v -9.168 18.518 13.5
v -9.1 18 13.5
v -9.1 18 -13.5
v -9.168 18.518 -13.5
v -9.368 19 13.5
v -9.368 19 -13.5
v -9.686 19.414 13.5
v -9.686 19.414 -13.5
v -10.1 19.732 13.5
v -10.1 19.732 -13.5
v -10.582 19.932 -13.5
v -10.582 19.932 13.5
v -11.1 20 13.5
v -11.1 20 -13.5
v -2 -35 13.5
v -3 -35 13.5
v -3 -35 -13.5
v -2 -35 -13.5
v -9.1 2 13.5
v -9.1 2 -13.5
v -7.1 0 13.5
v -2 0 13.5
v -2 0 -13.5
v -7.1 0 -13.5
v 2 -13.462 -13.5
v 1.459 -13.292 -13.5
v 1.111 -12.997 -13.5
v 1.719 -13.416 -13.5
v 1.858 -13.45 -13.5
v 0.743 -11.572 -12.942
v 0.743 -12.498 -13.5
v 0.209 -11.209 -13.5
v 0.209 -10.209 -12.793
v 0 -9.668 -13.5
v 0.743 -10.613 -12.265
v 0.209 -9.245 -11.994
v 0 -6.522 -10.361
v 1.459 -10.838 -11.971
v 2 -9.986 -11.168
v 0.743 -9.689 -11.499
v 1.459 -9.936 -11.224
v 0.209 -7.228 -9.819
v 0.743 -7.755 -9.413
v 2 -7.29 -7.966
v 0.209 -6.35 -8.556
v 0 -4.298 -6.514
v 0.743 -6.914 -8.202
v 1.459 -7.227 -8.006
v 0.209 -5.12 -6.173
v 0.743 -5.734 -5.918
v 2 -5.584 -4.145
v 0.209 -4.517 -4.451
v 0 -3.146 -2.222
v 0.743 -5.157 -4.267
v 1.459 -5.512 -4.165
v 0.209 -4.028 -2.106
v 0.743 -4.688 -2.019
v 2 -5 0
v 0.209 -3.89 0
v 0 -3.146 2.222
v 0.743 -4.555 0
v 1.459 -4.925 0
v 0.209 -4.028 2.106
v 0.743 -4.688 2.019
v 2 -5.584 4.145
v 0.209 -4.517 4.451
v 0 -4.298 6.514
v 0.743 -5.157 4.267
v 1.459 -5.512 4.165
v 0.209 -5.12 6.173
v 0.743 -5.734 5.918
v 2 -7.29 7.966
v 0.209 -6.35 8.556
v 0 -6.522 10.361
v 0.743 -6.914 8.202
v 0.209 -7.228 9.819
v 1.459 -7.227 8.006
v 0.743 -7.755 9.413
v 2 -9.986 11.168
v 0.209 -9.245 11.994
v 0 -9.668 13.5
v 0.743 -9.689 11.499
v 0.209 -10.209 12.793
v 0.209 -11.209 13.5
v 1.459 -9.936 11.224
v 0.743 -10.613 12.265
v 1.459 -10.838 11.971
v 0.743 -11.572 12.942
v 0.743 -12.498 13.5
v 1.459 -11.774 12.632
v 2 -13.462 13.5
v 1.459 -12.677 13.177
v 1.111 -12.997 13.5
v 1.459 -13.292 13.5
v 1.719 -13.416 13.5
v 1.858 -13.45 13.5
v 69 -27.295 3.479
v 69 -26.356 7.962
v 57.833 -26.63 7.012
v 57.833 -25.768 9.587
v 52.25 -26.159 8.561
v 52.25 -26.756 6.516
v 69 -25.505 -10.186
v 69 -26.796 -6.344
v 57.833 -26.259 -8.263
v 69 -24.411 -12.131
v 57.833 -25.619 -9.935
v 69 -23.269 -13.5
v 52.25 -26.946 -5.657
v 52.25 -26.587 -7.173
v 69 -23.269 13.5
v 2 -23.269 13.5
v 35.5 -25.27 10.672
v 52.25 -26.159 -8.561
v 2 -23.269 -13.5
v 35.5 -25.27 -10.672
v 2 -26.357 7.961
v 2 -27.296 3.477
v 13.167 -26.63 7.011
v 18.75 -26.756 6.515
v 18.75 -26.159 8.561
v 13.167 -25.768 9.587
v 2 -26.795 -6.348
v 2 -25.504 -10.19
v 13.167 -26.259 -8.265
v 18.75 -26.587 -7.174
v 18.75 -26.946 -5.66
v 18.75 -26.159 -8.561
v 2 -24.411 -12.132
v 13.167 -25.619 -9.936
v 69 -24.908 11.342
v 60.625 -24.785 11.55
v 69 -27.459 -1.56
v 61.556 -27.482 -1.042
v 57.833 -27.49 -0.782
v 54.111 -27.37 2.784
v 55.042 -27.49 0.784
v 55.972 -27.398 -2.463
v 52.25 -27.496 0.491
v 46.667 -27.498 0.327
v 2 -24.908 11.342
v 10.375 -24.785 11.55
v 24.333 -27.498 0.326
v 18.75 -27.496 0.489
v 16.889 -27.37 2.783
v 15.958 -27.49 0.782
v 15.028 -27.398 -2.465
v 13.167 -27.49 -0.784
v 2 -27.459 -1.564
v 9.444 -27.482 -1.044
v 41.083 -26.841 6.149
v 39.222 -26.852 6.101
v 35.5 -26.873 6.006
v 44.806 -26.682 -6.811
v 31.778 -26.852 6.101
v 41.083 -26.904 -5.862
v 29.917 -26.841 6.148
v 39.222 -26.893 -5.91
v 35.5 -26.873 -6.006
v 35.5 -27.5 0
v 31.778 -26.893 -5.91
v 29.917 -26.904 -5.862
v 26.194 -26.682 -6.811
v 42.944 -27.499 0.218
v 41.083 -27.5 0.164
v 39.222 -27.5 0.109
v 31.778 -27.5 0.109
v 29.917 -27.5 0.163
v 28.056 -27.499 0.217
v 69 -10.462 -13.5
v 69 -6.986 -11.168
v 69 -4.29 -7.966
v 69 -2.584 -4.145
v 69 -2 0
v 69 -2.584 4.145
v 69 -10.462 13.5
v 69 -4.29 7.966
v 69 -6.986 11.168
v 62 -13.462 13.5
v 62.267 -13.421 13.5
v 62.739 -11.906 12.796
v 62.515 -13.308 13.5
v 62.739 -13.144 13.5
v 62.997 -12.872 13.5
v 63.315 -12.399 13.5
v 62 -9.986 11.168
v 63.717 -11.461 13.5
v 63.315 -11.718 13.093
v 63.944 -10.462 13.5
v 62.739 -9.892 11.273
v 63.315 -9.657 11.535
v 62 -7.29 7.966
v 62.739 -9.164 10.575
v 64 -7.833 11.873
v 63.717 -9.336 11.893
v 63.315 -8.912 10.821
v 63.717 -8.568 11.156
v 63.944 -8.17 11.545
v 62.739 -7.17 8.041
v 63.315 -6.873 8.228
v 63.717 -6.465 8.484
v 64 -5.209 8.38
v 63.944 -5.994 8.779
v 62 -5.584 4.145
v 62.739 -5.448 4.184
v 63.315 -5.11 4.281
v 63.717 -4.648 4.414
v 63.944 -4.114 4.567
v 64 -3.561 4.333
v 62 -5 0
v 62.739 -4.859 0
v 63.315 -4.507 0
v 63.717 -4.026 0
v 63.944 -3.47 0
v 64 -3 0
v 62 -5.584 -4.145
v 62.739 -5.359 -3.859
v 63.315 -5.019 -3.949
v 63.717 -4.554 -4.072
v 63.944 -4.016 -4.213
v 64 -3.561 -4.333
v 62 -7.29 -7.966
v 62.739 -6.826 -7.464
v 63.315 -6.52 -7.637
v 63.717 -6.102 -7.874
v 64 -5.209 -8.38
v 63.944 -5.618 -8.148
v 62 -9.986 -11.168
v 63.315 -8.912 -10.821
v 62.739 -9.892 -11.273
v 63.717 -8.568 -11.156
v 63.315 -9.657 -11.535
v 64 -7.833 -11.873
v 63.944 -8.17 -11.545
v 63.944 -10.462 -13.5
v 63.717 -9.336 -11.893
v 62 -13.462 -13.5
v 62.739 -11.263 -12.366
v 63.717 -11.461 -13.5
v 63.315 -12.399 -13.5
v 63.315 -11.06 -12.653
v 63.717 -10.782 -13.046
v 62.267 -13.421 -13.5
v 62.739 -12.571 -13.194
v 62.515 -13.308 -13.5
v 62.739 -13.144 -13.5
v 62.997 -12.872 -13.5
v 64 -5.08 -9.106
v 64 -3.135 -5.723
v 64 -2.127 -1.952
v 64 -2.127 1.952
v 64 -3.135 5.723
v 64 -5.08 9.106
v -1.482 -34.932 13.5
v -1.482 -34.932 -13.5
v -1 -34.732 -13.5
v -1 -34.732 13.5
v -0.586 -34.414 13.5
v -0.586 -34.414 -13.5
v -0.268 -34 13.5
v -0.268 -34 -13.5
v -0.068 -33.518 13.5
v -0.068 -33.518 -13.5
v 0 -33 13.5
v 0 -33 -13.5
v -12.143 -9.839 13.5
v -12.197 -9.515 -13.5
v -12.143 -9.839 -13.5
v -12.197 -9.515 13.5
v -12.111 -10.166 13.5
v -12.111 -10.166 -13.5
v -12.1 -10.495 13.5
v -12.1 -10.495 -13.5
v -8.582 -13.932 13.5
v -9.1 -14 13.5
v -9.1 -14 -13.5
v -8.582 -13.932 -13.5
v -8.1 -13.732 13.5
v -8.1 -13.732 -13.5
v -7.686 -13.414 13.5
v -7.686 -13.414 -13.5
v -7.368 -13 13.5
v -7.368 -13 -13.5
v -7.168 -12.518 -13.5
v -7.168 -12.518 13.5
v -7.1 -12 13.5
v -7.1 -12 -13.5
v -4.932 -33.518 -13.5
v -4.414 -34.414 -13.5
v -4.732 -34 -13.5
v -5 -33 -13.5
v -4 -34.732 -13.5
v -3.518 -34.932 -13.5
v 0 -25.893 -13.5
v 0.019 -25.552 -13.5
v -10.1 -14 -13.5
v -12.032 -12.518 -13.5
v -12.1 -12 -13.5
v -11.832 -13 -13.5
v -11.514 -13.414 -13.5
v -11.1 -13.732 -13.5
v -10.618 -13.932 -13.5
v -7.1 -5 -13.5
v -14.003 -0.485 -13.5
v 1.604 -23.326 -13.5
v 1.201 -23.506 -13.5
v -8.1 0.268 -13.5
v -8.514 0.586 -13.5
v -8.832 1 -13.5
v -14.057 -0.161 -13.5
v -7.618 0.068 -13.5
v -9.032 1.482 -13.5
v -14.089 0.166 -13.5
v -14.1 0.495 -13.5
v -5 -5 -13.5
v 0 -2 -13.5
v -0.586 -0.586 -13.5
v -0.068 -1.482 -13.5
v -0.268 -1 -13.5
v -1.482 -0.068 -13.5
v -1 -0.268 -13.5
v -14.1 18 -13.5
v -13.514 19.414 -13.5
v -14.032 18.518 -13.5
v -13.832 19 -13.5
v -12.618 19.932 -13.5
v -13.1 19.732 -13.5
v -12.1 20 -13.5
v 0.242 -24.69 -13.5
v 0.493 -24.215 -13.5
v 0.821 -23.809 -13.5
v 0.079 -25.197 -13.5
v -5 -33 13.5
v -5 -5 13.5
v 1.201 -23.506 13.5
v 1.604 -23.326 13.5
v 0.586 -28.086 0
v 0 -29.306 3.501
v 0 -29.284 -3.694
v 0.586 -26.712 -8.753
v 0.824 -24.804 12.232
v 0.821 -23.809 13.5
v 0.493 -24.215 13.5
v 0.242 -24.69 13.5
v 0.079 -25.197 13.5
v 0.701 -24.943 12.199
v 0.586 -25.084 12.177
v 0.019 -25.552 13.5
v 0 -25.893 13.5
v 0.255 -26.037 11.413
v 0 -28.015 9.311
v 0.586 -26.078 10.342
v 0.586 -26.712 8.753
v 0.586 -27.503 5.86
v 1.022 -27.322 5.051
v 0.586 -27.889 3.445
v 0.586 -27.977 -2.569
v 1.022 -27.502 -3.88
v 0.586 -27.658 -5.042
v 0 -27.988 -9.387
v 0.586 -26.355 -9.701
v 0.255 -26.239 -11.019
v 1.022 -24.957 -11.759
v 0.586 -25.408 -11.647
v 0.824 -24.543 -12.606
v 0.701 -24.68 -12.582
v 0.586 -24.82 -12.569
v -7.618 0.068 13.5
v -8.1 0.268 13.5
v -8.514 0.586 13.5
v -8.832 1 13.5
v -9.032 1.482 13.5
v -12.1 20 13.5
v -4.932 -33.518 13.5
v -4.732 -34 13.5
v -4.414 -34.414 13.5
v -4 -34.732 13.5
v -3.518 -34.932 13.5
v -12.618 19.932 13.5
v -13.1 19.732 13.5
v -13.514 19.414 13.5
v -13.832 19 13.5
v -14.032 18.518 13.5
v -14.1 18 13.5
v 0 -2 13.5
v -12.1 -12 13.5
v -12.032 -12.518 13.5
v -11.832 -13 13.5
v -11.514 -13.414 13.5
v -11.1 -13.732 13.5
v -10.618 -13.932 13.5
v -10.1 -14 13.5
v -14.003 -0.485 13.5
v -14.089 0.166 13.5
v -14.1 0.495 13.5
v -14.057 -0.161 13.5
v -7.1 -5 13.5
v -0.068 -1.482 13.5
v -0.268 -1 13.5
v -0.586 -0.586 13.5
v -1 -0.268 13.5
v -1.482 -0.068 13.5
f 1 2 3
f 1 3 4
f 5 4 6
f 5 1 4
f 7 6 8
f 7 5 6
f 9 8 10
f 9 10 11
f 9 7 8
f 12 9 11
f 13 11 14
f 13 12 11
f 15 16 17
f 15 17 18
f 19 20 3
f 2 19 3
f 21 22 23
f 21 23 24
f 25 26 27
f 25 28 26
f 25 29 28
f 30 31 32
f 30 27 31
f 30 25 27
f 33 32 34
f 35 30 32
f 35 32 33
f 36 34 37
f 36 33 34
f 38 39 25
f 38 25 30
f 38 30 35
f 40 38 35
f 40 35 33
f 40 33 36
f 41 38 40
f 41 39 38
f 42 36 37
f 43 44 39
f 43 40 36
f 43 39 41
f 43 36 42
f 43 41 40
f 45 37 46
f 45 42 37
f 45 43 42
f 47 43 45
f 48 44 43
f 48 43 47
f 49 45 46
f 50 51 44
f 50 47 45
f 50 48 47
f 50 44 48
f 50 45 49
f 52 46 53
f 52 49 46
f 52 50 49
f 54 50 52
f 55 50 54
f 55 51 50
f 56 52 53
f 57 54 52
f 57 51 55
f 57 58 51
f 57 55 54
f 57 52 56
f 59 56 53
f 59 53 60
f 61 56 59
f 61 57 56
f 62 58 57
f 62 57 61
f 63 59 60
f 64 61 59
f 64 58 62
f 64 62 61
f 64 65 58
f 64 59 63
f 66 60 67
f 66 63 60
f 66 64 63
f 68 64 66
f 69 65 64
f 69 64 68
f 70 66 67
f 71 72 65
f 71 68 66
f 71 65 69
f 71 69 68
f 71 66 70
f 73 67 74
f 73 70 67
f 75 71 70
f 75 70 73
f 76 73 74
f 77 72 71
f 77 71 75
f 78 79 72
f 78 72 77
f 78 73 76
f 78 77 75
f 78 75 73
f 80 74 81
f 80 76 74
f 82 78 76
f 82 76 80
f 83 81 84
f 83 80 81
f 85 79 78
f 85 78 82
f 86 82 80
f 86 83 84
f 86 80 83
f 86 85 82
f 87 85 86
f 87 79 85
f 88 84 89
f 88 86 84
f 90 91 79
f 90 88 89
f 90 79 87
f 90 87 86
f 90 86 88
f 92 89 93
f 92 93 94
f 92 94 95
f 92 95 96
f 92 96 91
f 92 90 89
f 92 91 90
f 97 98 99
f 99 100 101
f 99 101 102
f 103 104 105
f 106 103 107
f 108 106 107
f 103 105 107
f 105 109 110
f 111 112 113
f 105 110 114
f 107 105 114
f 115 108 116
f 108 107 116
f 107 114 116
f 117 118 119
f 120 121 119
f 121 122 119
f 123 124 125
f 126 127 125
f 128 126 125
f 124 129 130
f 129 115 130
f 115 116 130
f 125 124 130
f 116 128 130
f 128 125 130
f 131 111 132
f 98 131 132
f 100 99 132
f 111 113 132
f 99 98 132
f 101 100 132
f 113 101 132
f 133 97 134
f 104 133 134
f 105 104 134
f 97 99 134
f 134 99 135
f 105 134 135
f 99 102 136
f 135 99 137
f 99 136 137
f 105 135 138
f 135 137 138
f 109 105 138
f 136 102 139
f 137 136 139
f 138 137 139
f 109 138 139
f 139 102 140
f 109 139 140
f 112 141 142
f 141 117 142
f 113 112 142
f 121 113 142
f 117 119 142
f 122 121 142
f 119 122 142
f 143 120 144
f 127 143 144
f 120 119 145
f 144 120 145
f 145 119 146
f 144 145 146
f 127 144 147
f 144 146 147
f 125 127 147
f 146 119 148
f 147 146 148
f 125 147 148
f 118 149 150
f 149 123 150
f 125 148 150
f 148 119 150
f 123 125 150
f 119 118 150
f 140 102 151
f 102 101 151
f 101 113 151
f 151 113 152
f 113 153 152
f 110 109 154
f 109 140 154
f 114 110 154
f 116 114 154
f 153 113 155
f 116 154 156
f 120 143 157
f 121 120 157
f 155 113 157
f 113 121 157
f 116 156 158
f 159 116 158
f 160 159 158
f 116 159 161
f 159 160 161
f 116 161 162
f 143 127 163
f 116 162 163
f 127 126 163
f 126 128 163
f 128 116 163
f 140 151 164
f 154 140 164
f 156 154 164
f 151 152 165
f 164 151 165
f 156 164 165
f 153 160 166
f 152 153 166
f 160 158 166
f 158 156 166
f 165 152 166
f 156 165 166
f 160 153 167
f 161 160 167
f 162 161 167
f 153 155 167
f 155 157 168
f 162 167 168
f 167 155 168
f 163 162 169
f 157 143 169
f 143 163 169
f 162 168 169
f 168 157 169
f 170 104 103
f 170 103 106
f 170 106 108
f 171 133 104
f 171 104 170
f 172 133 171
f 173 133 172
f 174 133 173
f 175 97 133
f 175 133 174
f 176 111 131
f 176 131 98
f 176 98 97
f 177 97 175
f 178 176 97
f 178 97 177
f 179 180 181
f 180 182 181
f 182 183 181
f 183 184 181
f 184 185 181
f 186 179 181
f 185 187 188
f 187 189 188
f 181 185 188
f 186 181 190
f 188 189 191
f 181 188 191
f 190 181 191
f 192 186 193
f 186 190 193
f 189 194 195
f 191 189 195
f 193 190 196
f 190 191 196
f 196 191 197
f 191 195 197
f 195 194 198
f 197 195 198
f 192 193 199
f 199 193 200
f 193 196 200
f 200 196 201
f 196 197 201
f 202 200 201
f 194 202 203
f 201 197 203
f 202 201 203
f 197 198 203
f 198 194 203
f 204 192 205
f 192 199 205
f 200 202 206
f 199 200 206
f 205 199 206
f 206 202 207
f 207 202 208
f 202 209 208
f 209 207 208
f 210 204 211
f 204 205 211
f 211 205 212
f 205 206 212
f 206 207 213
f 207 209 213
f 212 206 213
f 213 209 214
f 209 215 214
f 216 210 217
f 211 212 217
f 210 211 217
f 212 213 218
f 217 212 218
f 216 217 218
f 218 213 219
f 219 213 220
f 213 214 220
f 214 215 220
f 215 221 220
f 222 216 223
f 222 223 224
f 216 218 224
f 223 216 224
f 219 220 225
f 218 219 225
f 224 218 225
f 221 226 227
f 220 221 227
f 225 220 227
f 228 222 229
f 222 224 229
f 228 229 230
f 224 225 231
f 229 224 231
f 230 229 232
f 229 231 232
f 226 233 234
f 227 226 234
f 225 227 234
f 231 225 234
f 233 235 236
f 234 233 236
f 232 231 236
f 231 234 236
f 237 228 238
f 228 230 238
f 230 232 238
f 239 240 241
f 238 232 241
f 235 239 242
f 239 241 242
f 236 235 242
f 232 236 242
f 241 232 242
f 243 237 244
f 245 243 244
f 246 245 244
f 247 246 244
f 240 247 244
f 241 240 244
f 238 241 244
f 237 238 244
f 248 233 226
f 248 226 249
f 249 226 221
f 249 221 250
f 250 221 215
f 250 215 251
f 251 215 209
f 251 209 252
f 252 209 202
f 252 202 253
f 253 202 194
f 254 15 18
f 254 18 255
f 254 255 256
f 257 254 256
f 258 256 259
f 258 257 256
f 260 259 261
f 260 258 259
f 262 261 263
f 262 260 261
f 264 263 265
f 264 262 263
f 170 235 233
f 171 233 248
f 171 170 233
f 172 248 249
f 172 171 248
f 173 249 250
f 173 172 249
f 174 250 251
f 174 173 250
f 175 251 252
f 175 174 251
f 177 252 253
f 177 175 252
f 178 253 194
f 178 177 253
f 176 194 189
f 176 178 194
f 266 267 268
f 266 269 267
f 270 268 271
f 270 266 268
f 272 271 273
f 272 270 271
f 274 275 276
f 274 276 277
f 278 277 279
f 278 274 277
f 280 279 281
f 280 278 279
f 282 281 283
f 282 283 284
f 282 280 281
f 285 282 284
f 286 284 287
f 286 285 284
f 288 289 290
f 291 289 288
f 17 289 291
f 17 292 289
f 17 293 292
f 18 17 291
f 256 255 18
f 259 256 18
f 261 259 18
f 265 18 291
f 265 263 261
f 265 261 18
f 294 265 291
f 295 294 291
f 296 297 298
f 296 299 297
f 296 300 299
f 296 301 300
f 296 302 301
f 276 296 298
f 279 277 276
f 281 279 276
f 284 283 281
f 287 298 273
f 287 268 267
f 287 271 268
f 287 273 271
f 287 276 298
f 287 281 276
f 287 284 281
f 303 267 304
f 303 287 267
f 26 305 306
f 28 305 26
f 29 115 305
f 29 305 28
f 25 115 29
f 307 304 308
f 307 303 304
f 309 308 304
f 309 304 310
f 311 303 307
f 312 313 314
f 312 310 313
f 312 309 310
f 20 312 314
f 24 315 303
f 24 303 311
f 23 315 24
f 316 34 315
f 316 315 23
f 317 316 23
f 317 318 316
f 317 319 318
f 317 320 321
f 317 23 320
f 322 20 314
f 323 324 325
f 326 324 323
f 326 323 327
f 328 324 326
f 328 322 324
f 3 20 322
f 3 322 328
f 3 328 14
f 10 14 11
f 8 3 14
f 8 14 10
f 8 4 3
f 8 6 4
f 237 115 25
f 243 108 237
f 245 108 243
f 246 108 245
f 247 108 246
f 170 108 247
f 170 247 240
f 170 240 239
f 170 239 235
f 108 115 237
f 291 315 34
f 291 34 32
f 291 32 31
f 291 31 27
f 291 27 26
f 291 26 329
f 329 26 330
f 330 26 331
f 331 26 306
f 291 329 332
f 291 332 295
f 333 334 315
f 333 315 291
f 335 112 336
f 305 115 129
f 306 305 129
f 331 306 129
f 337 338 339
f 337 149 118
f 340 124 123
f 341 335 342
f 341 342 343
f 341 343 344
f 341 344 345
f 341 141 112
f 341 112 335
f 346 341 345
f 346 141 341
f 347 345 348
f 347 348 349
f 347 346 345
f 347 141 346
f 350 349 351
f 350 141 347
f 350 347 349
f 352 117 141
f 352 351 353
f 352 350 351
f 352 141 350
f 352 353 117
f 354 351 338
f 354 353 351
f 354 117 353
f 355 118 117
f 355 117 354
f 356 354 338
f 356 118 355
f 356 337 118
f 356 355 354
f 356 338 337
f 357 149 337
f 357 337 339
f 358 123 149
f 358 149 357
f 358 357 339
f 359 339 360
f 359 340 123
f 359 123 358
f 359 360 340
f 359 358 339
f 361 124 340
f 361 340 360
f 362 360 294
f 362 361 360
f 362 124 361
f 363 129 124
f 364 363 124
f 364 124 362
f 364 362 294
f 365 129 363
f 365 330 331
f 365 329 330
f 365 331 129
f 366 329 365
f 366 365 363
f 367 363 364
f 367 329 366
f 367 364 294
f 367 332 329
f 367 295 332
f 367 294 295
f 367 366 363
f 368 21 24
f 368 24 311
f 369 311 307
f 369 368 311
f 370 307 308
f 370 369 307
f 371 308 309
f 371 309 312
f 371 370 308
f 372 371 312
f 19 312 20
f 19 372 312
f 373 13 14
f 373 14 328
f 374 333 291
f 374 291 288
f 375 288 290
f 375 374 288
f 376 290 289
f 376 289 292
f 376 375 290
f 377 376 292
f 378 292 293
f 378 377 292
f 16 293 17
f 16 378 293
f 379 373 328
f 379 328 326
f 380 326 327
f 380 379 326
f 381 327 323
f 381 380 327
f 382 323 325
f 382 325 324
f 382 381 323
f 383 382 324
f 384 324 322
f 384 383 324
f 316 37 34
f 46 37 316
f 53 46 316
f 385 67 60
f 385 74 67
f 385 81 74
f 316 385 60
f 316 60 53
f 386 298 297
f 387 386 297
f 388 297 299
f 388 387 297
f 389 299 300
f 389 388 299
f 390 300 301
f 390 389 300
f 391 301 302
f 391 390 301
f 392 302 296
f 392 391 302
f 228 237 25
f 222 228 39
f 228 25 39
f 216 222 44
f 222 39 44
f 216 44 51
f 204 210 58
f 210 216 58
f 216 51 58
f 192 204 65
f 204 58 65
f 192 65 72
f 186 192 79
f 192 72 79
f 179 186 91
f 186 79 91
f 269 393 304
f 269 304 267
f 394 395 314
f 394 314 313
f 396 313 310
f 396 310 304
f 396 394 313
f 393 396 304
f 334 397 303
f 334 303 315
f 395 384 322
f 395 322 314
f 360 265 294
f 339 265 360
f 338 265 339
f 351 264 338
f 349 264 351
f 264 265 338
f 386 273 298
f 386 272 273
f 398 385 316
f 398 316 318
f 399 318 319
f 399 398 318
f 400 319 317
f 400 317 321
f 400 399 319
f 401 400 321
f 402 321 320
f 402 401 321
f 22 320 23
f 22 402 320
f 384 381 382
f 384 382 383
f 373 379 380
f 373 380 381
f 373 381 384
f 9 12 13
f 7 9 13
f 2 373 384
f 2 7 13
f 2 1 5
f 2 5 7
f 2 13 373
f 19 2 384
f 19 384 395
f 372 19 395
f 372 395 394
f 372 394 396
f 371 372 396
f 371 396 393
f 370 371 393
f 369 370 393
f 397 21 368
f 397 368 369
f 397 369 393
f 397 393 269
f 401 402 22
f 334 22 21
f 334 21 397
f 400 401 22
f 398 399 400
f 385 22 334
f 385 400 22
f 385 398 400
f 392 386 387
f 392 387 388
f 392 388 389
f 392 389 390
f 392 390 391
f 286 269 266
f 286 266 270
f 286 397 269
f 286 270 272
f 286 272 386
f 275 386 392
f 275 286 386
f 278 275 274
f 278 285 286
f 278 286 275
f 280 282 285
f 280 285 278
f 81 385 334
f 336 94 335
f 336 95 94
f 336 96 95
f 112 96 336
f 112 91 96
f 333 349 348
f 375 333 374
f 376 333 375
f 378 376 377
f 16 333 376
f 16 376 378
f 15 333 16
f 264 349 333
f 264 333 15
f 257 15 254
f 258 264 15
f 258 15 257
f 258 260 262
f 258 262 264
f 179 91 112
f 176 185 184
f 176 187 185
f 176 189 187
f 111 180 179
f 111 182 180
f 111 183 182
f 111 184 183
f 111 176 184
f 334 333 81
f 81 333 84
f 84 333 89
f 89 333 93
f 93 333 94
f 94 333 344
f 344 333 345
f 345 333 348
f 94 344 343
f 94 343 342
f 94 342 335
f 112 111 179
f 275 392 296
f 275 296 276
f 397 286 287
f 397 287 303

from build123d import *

# Parameters (mm, degrees)
F3_DEPTH = 13.5
F5_DEPTH = 69
F7_DEPTH = 5
F8_R     = 2


with BuildPart() as f3:
    # F2 (on Top) → F3 (new body, symmetric)
    with BuildSketch(Plane.XY):
        with BuildLine():
            ThreePointArc((-12.1, -12), (-11.5142135624, -13.4142135624), (-10.1, -14))
            Line((-10.1, -14), (-9.1, -14))
            ThreePointArc((-9.1, -14), (-7.6857864376, -13.4142135624), (-7.1, -12))
            Line((-7.1, -12), (-7.1, -5))
            Line((-7.1, -5), (-5, -5))
            Line((-5, -5), (-5, -33))
            ThreePointArc((-5, -33), (-4.4142135624, -34.4142135624), (-3, -35))
            Line((-3, -35), (-2, -35))
            ThreePointArc((-2, -35), (-0.5857864376, -34.4142135624), (0, -33))
            Line((0, -33), (0, -2))
            ThreePointArc((0, -2), (-0.5857864376, -0.5857864376), (-2, 0))
            Line((-2, 0), (-7.1, 0))
            ThreePointArc((-7.1, 0), (-8.5142135624, 0.5857864376), (-9.1, 2))
            Line((-9.1, 2), (-9.1, 18))
            ThreePointArc((-9.1, 18), (-9.6857864376, 19.4142135624), (-11.1, 20))
            Line((-11.1, 20), (-12.1, 20))
            ThreePointArc((-12.1, 20), (-13.5142135624, 19.4142135624), (-14.1, 18))
            Line((-14.1, 18), (-14.1, 0.495097568))
            ThreePointArc((-14.1, 0.495097568), (-14.0756666333, 0.0024094781), (-14.0029033785, -0.4854831077))
            Line((-14.0029033785, -0.4854831077), (-12.1970966215, -9.5145168923))
            ThreePointArc((-12.1970966215, -9.5145168923), (-12.1243333667, -10.0024094781), (-12.1, -10.495097568))
            Line((-12.1, -10.495097568), (-12.1, -12))
        make_face()
    extrude(amount=F3_DEPTH, both=True)

    # F4 (on face) → F5 (join)
    with BuildSketch(Plane.YZ):
        with BuildLine():
            Line((-23.2691742077, -13.5), (-16.7308257923, -13.5))
            add(Edge.make_bspline(
                [(-16.7308257923, -13.5), (-2.7938199597, 0), (-16.7308257923, 13.5)],
                knots=[0.4510268118, 0.4510268118, 0.4510268118, 2.6905658418, 2.6905658418, 2.6905658418], degree=2, weights=[1, 0.4358898944, 1]))
            Line((-16.7308257923, 13.5), (-23.2691742077, 13.5))
            add(Edge.make_bspline(
                [(-23.2691742077, 13.5), (-37.2061800403, 0), (-23.2691742077, -13.5)],
                knots=[3.5926194654, 3.5926194654, 3.5926194654, 5.8321584954, 5.8321584954, 5.8321584954], degree=2, weights=[1, 0.4358898944, 1]))
        make_face()
        with BuildLine():
            Line((-16.7308257923, -13.5), (-13.4616515847, -13.5))
            ThreePointArc((-13.4616515847, -13.5), (-5, 0), (-13.4616515847, 13.5))
            Line((-13.4616515847, 13.5), (-16.7308257923, 13.5))
            add(Edge.make_bspline(
                [(-16.7308257923, -13.5), (-2.7938199597, 0), (-16.7308257923, 13.5)],
                knots=[0.4510268118, 0.4510268118, 0.4510268118, 2.6905658418, 2.6905658418, 2.6905658418], degree=2, weights=[1, 0.4358898944, 1]))
        make_face()
    extrude(amount=F5_DEPTH)

    # F6 (on face) → F7 (join)
    with BuildSketch(Plane.YZ.offset(69)):
        with BuildLine():
            Line((-10.4616515847, 13.5), (-13.4616515847, 13.5))
            ThreePointArc((-13.4616515847, 13.5), (-5, 0), (-13.4616515847, -13.5))
            Line((-13.4616515847, -13.5), (-10.4616515847, -13.5))
            ThreePointArc((-10.4616515847, -13.5), (-2, 0), (-10.4616515847, 13.5))
        make_face()
    extrude(amount=-F7_DEPTH)

    # F8
    f8_edges = [f3.edges().sort_by_distance(p)[0] for p in [
        (0, -5, 0),
        (0, -27.5, -0.000816),
        (64, -5, 0),
    ]]
    fillet(f8_edges, radius=F8_R)


solid = f3.part
